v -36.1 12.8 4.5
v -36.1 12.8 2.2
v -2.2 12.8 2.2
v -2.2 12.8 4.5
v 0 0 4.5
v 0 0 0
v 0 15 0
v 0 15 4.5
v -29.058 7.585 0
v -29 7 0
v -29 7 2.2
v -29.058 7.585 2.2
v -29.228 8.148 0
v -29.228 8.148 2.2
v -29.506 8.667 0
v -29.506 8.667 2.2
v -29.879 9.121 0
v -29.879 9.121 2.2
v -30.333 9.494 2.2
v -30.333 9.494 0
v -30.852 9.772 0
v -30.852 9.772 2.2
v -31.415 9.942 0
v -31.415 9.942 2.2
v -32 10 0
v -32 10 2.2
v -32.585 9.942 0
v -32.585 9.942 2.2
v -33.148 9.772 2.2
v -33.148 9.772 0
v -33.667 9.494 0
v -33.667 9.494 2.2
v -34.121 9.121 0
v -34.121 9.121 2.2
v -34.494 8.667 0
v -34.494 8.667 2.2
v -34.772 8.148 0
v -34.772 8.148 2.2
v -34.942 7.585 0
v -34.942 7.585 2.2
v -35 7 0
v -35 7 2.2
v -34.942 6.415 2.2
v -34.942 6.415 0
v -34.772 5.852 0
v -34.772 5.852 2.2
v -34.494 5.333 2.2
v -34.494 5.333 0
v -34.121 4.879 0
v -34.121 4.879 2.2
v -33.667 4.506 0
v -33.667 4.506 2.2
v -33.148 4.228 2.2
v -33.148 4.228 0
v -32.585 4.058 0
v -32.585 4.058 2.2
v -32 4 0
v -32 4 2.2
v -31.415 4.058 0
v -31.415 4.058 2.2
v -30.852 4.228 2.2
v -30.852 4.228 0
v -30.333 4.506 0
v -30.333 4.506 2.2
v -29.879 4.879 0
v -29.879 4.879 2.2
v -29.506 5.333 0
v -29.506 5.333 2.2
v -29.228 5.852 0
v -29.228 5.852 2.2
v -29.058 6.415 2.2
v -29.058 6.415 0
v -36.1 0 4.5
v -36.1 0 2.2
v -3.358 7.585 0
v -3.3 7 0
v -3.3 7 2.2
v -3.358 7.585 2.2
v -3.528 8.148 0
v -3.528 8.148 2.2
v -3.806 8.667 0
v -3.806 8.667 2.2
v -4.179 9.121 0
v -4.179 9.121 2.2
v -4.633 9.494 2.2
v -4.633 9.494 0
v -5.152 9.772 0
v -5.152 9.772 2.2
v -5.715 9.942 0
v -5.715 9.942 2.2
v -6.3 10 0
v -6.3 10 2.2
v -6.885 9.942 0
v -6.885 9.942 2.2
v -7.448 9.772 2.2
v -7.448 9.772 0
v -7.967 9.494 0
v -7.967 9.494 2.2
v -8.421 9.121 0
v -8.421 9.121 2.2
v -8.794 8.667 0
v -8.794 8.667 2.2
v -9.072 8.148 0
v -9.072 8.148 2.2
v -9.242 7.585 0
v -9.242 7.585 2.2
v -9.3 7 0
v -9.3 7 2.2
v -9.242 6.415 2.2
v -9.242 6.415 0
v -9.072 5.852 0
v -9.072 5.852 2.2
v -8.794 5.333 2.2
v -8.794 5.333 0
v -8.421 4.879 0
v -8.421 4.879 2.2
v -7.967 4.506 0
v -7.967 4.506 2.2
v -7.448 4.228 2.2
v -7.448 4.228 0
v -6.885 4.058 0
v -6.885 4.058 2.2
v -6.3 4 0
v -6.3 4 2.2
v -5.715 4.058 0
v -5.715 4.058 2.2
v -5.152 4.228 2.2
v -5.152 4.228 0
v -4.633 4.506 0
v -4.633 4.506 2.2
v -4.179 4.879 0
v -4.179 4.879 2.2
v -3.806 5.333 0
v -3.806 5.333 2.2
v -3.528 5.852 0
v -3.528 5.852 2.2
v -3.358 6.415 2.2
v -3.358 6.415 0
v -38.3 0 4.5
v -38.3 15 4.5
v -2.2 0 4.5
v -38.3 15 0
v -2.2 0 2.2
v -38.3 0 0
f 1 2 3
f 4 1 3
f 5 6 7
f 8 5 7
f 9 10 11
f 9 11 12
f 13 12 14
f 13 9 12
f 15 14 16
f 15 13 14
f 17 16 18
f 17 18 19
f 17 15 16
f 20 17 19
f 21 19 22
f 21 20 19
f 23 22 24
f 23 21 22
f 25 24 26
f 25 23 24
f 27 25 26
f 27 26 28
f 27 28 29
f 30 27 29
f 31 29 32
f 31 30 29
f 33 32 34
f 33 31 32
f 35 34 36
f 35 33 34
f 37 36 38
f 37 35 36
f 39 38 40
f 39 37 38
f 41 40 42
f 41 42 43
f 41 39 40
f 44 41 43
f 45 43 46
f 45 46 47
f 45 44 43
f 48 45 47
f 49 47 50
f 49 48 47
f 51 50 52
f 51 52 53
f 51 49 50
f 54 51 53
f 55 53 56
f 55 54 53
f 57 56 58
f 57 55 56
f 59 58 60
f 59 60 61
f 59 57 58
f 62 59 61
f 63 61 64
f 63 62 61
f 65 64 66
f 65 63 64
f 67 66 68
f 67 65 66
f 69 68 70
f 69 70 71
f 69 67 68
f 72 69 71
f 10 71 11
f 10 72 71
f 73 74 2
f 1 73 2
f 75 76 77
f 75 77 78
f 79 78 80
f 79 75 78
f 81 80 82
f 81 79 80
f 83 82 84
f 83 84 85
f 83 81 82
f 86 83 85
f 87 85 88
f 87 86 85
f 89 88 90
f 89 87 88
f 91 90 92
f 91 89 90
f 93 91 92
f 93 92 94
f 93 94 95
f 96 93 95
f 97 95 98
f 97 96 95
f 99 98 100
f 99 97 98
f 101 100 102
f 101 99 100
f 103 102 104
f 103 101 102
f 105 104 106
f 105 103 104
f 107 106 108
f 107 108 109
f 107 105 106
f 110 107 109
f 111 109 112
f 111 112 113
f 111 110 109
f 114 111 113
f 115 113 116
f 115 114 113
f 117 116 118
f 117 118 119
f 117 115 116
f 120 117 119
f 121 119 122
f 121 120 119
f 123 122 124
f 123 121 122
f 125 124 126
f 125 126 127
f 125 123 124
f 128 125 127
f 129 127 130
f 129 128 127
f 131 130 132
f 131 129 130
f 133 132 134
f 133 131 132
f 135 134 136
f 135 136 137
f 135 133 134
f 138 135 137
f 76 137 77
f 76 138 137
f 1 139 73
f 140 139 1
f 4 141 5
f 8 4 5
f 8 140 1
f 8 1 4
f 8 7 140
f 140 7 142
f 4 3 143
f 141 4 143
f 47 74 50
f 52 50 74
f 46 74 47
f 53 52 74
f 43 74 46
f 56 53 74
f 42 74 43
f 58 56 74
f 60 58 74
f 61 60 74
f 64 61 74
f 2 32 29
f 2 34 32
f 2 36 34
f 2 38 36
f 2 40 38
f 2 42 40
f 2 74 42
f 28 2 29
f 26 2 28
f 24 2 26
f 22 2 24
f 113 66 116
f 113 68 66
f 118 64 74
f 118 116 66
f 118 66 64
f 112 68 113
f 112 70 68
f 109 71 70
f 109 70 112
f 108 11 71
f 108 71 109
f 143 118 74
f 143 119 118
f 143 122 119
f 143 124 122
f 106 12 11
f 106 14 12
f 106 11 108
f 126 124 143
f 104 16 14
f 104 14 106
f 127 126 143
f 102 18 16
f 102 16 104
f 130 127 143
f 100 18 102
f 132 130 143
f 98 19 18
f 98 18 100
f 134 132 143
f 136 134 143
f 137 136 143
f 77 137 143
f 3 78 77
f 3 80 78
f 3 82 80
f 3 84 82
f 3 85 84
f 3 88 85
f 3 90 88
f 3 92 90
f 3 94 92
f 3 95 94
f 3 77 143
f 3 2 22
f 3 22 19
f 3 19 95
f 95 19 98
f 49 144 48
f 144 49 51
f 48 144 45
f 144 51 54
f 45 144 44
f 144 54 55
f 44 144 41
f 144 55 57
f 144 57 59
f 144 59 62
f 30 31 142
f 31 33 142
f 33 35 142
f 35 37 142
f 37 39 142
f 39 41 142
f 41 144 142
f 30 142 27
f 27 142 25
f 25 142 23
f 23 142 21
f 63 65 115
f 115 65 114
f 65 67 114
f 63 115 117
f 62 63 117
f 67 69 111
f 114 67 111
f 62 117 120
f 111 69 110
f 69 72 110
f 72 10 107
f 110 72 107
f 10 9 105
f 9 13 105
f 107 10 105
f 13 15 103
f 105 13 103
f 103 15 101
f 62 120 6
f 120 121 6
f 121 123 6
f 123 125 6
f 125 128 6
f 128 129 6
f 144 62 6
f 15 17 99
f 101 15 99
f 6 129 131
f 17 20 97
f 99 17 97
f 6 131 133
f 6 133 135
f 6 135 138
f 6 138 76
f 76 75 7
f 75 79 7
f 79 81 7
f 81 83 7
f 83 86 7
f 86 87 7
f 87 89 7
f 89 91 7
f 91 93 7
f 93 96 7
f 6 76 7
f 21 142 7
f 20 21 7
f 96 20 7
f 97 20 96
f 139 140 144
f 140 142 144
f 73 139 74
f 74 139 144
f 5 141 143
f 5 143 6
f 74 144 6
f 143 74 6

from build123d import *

# Parameters (mm, degrees)
F0_W     = 38.3
F0_H     = 15
F0_R     = 3
F1_DEPTH = 2.2
F3_DEPTH = 2.3


with BuildPart() as f1:
    # F0 (on Top) → F1 (new body)
    with BuildSketch(Plane.XY):
        with Locations((-19.15, 7.5)):
            Rectangle(F0_W, F0_H)
        with Locations((-32, 7)):
            Circle(F0_R, mode=Mode.SUBTRACT)
        with Locations((-6.3, 7)):
            Circle(F0_R, mode=Mode.SUBTRACT)
    extrude(amount=F1_DEPTH)

    # F2 (on face) → F3 (join)
    with BuildSketch(Plane.XY.offset(2.2)):
        Polygon((0, 15), (-38.3, 15), (-38.3, 0), (-36.1, 0), (-36.1, 12.8), (-2.2, 12.8), (-2.2, 0), (0, 0), align=None)
    extrude(amount=F3_DEPTH)


solid = f1.part
